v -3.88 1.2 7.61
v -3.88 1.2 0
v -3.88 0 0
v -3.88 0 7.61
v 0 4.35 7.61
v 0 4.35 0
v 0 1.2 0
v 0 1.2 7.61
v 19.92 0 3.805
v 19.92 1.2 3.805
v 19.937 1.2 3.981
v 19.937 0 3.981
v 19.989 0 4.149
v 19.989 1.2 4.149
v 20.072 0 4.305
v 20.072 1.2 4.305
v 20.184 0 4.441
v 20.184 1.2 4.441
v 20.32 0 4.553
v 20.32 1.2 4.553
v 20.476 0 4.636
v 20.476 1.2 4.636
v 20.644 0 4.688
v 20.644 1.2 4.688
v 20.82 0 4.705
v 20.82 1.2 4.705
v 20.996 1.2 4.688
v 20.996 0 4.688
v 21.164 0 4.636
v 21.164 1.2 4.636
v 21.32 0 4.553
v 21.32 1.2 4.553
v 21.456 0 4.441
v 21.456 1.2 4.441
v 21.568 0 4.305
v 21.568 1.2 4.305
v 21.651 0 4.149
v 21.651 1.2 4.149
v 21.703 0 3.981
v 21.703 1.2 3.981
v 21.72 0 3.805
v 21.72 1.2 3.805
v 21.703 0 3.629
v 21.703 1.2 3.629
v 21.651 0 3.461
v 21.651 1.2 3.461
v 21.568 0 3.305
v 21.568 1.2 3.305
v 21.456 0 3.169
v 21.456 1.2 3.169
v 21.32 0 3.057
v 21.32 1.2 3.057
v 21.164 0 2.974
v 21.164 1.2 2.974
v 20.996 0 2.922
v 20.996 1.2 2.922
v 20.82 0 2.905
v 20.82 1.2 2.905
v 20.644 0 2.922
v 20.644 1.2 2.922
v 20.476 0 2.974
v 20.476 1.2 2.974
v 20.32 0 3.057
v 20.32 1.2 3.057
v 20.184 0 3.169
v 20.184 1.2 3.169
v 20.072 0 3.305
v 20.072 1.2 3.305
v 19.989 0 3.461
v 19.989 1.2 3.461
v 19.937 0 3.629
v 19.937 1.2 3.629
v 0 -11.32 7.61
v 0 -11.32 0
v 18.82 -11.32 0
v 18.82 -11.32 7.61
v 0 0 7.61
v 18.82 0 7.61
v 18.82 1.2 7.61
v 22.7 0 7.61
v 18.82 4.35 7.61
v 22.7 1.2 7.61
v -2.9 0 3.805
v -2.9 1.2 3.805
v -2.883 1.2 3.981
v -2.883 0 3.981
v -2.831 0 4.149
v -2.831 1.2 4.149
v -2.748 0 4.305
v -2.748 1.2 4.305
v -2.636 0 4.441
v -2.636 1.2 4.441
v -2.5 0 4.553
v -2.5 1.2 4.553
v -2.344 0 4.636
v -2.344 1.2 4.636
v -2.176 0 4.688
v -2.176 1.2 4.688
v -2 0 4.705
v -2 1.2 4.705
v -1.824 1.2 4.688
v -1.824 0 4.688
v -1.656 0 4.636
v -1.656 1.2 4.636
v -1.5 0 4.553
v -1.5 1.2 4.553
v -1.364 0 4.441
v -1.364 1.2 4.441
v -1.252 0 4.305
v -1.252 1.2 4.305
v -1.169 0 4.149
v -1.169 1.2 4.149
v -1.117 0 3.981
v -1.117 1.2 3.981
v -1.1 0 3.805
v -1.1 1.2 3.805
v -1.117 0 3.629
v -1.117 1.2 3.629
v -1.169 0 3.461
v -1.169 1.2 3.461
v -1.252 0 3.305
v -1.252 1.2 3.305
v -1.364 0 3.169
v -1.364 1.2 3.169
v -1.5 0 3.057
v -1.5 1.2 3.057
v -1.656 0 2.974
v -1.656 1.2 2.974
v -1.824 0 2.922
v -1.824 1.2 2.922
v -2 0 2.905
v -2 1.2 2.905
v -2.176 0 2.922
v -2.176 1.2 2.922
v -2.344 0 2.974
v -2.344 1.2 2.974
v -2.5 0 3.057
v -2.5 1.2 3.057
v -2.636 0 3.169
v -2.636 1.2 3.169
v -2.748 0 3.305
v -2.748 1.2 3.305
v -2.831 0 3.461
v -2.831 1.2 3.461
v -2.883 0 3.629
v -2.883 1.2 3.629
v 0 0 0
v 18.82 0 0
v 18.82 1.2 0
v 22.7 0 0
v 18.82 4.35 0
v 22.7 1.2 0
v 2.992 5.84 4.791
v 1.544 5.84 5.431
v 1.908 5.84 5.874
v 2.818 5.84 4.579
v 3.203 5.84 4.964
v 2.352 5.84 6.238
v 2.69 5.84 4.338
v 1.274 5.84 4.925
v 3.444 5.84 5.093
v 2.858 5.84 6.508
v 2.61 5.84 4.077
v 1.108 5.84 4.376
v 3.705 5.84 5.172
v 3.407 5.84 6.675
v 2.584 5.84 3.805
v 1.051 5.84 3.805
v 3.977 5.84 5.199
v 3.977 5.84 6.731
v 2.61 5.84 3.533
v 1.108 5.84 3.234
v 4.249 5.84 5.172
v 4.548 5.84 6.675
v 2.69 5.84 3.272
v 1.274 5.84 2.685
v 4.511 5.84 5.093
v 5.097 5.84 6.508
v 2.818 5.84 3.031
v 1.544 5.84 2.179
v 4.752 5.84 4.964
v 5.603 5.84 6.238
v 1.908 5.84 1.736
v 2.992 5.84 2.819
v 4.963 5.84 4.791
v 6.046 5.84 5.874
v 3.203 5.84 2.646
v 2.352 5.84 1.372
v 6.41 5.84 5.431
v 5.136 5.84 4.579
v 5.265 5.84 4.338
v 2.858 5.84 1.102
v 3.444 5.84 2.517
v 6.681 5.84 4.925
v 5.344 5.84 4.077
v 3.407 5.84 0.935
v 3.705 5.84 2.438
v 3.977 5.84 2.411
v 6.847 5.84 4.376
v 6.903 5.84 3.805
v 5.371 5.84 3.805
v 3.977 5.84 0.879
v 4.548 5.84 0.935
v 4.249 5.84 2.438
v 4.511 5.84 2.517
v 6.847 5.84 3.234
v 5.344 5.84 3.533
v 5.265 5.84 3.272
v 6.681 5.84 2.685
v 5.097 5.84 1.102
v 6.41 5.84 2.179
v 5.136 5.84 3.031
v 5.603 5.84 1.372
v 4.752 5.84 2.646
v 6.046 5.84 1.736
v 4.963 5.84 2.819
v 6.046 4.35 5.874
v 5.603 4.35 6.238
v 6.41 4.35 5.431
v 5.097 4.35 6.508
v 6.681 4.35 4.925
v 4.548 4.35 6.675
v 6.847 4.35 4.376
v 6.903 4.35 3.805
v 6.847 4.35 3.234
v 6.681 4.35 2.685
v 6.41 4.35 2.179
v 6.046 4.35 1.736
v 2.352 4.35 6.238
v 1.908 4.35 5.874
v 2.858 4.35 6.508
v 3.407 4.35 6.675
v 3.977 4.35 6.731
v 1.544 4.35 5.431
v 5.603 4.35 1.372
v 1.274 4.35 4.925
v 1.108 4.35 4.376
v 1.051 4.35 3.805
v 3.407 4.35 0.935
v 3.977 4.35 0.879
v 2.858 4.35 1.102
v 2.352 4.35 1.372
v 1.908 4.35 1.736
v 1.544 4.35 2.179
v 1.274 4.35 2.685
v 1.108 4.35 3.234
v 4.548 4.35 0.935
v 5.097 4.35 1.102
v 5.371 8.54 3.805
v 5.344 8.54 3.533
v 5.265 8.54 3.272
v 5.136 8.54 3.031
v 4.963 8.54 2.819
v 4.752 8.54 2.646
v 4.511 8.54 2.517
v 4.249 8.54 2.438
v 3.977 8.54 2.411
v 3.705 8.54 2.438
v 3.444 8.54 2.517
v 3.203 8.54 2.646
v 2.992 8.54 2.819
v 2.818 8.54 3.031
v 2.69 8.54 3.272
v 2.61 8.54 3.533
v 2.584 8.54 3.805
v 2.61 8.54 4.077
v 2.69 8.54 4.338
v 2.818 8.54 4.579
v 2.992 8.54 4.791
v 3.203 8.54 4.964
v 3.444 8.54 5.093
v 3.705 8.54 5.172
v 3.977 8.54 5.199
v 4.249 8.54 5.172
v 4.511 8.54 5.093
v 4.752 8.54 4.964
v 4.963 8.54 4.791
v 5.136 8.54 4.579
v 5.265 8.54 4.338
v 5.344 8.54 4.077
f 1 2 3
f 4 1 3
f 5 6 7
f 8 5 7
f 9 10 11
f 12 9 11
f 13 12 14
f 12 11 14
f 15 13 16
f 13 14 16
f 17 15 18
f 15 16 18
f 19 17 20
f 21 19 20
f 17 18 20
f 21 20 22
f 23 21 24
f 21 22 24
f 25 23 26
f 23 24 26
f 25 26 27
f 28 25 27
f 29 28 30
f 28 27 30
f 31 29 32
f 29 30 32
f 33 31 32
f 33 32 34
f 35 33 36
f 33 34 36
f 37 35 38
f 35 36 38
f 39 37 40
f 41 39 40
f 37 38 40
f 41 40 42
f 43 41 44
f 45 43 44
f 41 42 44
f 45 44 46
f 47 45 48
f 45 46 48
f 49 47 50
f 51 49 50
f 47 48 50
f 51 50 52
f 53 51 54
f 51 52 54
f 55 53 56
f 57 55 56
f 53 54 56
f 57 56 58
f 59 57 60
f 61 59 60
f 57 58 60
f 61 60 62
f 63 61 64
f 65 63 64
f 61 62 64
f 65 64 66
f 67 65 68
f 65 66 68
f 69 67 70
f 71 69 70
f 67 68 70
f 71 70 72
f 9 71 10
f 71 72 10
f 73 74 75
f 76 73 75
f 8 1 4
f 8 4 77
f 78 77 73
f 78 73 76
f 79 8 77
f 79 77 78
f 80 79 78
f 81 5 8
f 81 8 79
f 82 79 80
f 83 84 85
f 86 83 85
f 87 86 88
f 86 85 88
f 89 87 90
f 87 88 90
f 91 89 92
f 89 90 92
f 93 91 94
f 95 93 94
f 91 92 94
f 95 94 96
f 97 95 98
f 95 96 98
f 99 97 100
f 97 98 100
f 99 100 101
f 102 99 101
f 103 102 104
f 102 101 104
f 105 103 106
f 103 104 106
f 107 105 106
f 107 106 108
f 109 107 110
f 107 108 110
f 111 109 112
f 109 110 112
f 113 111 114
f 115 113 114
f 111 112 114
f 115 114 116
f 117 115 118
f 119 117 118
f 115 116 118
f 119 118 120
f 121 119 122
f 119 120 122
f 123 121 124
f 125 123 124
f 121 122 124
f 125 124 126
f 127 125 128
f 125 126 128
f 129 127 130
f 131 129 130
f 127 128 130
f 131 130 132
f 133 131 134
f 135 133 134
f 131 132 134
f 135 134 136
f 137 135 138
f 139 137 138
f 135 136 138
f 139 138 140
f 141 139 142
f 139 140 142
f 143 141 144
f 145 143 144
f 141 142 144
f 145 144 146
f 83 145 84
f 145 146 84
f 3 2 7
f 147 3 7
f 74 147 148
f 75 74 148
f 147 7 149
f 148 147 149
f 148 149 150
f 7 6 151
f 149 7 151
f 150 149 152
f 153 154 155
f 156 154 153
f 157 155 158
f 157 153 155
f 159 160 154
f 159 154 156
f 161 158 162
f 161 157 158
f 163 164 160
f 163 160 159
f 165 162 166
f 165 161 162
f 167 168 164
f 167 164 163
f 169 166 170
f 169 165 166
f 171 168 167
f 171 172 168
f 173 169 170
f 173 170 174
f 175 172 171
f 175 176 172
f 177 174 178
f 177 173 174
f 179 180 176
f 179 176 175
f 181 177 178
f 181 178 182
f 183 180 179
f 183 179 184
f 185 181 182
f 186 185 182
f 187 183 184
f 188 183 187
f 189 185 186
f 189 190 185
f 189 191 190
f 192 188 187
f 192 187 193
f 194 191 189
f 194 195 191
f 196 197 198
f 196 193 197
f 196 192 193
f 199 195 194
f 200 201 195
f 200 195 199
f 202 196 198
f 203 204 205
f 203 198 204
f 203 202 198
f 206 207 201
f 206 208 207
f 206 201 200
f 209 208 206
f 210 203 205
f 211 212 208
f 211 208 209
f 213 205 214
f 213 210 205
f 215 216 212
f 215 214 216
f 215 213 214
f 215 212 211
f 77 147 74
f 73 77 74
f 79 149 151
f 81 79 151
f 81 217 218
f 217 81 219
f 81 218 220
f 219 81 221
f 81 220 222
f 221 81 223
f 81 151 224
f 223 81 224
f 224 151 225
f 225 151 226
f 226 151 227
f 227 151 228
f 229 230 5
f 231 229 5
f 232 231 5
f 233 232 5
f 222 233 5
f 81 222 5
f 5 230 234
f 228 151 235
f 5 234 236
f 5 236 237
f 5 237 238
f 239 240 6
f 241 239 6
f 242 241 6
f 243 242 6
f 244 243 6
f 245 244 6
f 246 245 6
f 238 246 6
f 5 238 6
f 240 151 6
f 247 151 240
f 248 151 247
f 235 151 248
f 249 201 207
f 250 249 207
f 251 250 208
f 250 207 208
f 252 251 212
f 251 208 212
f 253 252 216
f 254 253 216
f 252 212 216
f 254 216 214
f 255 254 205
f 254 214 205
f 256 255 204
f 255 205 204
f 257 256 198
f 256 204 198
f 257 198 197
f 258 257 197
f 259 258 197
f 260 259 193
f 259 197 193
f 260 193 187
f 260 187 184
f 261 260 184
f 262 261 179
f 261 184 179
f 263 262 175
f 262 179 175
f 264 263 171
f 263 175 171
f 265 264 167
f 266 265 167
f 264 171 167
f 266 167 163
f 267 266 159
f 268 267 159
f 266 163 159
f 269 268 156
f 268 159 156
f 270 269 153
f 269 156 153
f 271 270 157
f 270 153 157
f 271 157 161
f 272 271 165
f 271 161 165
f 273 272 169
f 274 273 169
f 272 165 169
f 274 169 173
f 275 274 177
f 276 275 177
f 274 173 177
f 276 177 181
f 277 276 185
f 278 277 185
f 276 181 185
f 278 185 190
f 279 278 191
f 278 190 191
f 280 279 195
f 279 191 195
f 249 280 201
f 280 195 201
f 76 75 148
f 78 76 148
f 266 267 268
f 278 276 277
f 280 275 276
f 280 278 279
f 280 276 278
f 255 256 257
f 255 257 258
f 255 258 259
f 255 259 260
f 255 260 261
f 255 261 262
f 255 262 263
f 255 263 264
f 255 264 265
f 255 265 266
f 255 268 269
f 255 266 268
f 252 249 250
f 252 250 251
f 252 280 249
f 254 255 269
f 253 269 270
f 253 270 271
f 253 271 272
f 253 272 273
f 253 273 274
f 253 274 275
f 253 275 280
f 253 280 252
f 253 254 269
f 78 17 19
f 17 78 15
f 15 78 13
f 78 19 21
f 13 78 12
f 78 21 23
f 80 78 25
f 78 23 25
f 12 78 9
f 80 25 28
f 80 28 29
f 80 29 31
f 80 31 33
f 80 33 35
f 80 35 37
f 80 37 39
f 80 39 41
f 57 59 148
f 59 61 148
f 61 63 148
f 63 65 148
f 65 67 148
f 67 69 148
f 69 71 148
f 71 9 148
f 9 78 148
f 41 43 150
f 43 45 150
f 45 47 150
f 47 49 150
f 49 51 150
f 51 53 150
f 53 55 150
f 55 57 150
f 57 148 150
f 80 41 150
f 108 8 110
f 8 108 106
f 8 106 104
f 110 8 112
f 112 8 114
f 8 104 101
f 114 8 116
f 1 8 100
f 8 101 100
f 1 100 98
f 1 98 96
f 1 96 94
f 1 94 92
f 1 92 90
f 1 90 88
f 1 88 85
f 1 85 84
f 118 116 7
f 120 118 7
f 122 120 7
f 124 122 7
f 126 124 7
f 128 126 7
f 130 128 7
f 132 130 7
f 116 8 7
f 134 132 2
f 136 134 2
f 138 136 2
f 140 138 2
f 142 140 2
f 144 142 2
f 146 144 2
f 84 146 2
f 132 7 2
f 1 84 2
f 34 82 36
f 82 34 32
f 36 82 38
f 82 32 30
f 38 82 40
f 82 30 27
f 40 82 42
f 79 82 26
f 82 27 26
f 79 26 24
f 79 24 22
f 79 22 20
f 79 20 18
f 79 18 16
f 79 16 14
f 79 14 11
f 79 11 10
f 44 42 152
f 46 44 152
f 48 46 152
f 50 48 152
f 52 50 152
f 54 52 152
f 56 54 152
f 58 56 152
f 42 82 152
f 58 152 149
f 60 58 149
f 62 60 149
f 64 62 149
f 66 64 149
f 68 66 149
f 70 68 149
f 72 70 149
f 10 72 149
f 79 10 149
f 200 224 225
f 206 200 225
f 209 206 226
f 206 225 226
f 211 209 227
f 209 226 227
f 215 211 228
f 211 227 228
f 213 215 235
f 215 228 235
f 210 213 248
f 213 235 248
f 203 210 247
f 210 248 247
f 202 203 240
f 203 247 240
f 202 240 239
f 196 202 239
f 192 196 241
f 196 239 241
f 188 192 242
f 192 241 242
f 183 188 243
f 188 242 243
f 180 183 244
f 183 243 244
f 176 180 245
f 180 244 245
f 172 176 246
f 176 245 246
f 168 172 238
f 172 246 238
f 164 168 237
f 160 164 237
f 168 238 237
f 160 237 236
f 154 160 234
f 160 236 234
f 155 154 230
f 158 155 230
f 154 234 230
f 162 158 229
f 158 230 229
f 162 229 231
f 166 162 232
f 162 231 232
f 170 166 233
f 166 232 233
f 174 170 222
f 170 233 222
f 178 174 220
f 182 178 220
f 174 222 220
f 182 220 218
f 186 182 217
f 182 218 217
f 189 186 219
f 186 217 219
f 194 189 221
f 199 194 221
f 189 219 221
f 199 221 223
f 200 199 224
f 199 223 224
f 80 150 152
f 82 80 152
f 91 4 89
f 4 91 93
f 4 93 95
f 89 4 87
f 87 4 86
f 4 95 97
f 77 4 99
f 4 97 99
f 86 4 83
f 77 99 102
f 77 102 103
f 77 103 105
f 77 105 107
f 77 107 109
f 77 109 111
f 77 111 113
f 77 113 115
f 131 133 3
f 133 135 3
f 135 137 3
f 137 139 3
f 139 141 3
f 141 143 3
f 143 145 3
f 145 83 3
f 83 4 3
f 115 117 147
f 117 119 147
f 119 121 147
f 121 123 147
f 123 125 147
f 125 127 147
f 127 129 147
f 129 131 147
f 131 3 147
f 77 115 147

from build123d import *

# Parameters (mm, degrees)
BOSS_EXTRUDE1_DEPTH = 7.61
SKETCH2_R           = 0.9
CUT_EXTRUDE1_DEPTH  = 1.2
SKETCH3_R           = 2.926040877
BOSS_EXTRUDE2_DEPTH = 1.49
SKETCH4_R           = 1.393854302
BOSS_EXTRUDE3_DEPTH = 2.7


with BuildPart() as part:
    # Sketch1 → Boss-Extrude1 (new body)
    with BuildSketch(Plane.XY):
        Polygon((0, 0), (0, -11.32), (18.82, -11.32), (18.82, 0), (22.7, 0), (22.7, 1.2), (18.82, 1.2), (18.82, 4.35), (0, 4.35), (0, 1.2), (-3.88, 1.2), (-3.88, 0), align=None)
    extrude(amount=BOSS_EXTRUDE1_DEPTH)

    # Sketch2 → Cut-Extrude1 (cut)
    with BuildSketch(Plane(origin=(0, 1.2, 0), x_dir=(1, 0, 0), z_dir=(0, 1, 0))):
        with Locations(Location((20.82, -3.805, 0), (0, 0, 180))):
            Circle(SKETCH2_R)
        with Locations(Location((-2, -3.805, 0), (0, 0, 180))):
            Circle(SKETCH2_R)
    extrude(amount=-CUT_EXTRUDE1_DEPTH, mode=Mode.SUBTRACT)

    # Sketch3 → Boss-Extrude2 (add)
    with BuildSketch(Plane(origin=(0, 4.35, 0), x_dir=(1, 0, 0), z_dir=(0, 1, 0))):
        with Locations((3.977412239, -3.805)):
            Circle(SKETCH3_R)
    extrude(amount=BOSS_EXTRUDE2_DEPTH)

    # Sketch4 → Boss-Extrude3 (add)
    with BuildSketch(Plane(origin=(0, 5.84, 0), x_dir=(1, 0, 0), z_dir=(0, 1, 0))):
        with Locations((3.977412239, -3.805)):
            Circle(SKETCH4_R)
    extrude(amount=BOSS_EXTRUDE3_DEPTH)


solid = part.part
